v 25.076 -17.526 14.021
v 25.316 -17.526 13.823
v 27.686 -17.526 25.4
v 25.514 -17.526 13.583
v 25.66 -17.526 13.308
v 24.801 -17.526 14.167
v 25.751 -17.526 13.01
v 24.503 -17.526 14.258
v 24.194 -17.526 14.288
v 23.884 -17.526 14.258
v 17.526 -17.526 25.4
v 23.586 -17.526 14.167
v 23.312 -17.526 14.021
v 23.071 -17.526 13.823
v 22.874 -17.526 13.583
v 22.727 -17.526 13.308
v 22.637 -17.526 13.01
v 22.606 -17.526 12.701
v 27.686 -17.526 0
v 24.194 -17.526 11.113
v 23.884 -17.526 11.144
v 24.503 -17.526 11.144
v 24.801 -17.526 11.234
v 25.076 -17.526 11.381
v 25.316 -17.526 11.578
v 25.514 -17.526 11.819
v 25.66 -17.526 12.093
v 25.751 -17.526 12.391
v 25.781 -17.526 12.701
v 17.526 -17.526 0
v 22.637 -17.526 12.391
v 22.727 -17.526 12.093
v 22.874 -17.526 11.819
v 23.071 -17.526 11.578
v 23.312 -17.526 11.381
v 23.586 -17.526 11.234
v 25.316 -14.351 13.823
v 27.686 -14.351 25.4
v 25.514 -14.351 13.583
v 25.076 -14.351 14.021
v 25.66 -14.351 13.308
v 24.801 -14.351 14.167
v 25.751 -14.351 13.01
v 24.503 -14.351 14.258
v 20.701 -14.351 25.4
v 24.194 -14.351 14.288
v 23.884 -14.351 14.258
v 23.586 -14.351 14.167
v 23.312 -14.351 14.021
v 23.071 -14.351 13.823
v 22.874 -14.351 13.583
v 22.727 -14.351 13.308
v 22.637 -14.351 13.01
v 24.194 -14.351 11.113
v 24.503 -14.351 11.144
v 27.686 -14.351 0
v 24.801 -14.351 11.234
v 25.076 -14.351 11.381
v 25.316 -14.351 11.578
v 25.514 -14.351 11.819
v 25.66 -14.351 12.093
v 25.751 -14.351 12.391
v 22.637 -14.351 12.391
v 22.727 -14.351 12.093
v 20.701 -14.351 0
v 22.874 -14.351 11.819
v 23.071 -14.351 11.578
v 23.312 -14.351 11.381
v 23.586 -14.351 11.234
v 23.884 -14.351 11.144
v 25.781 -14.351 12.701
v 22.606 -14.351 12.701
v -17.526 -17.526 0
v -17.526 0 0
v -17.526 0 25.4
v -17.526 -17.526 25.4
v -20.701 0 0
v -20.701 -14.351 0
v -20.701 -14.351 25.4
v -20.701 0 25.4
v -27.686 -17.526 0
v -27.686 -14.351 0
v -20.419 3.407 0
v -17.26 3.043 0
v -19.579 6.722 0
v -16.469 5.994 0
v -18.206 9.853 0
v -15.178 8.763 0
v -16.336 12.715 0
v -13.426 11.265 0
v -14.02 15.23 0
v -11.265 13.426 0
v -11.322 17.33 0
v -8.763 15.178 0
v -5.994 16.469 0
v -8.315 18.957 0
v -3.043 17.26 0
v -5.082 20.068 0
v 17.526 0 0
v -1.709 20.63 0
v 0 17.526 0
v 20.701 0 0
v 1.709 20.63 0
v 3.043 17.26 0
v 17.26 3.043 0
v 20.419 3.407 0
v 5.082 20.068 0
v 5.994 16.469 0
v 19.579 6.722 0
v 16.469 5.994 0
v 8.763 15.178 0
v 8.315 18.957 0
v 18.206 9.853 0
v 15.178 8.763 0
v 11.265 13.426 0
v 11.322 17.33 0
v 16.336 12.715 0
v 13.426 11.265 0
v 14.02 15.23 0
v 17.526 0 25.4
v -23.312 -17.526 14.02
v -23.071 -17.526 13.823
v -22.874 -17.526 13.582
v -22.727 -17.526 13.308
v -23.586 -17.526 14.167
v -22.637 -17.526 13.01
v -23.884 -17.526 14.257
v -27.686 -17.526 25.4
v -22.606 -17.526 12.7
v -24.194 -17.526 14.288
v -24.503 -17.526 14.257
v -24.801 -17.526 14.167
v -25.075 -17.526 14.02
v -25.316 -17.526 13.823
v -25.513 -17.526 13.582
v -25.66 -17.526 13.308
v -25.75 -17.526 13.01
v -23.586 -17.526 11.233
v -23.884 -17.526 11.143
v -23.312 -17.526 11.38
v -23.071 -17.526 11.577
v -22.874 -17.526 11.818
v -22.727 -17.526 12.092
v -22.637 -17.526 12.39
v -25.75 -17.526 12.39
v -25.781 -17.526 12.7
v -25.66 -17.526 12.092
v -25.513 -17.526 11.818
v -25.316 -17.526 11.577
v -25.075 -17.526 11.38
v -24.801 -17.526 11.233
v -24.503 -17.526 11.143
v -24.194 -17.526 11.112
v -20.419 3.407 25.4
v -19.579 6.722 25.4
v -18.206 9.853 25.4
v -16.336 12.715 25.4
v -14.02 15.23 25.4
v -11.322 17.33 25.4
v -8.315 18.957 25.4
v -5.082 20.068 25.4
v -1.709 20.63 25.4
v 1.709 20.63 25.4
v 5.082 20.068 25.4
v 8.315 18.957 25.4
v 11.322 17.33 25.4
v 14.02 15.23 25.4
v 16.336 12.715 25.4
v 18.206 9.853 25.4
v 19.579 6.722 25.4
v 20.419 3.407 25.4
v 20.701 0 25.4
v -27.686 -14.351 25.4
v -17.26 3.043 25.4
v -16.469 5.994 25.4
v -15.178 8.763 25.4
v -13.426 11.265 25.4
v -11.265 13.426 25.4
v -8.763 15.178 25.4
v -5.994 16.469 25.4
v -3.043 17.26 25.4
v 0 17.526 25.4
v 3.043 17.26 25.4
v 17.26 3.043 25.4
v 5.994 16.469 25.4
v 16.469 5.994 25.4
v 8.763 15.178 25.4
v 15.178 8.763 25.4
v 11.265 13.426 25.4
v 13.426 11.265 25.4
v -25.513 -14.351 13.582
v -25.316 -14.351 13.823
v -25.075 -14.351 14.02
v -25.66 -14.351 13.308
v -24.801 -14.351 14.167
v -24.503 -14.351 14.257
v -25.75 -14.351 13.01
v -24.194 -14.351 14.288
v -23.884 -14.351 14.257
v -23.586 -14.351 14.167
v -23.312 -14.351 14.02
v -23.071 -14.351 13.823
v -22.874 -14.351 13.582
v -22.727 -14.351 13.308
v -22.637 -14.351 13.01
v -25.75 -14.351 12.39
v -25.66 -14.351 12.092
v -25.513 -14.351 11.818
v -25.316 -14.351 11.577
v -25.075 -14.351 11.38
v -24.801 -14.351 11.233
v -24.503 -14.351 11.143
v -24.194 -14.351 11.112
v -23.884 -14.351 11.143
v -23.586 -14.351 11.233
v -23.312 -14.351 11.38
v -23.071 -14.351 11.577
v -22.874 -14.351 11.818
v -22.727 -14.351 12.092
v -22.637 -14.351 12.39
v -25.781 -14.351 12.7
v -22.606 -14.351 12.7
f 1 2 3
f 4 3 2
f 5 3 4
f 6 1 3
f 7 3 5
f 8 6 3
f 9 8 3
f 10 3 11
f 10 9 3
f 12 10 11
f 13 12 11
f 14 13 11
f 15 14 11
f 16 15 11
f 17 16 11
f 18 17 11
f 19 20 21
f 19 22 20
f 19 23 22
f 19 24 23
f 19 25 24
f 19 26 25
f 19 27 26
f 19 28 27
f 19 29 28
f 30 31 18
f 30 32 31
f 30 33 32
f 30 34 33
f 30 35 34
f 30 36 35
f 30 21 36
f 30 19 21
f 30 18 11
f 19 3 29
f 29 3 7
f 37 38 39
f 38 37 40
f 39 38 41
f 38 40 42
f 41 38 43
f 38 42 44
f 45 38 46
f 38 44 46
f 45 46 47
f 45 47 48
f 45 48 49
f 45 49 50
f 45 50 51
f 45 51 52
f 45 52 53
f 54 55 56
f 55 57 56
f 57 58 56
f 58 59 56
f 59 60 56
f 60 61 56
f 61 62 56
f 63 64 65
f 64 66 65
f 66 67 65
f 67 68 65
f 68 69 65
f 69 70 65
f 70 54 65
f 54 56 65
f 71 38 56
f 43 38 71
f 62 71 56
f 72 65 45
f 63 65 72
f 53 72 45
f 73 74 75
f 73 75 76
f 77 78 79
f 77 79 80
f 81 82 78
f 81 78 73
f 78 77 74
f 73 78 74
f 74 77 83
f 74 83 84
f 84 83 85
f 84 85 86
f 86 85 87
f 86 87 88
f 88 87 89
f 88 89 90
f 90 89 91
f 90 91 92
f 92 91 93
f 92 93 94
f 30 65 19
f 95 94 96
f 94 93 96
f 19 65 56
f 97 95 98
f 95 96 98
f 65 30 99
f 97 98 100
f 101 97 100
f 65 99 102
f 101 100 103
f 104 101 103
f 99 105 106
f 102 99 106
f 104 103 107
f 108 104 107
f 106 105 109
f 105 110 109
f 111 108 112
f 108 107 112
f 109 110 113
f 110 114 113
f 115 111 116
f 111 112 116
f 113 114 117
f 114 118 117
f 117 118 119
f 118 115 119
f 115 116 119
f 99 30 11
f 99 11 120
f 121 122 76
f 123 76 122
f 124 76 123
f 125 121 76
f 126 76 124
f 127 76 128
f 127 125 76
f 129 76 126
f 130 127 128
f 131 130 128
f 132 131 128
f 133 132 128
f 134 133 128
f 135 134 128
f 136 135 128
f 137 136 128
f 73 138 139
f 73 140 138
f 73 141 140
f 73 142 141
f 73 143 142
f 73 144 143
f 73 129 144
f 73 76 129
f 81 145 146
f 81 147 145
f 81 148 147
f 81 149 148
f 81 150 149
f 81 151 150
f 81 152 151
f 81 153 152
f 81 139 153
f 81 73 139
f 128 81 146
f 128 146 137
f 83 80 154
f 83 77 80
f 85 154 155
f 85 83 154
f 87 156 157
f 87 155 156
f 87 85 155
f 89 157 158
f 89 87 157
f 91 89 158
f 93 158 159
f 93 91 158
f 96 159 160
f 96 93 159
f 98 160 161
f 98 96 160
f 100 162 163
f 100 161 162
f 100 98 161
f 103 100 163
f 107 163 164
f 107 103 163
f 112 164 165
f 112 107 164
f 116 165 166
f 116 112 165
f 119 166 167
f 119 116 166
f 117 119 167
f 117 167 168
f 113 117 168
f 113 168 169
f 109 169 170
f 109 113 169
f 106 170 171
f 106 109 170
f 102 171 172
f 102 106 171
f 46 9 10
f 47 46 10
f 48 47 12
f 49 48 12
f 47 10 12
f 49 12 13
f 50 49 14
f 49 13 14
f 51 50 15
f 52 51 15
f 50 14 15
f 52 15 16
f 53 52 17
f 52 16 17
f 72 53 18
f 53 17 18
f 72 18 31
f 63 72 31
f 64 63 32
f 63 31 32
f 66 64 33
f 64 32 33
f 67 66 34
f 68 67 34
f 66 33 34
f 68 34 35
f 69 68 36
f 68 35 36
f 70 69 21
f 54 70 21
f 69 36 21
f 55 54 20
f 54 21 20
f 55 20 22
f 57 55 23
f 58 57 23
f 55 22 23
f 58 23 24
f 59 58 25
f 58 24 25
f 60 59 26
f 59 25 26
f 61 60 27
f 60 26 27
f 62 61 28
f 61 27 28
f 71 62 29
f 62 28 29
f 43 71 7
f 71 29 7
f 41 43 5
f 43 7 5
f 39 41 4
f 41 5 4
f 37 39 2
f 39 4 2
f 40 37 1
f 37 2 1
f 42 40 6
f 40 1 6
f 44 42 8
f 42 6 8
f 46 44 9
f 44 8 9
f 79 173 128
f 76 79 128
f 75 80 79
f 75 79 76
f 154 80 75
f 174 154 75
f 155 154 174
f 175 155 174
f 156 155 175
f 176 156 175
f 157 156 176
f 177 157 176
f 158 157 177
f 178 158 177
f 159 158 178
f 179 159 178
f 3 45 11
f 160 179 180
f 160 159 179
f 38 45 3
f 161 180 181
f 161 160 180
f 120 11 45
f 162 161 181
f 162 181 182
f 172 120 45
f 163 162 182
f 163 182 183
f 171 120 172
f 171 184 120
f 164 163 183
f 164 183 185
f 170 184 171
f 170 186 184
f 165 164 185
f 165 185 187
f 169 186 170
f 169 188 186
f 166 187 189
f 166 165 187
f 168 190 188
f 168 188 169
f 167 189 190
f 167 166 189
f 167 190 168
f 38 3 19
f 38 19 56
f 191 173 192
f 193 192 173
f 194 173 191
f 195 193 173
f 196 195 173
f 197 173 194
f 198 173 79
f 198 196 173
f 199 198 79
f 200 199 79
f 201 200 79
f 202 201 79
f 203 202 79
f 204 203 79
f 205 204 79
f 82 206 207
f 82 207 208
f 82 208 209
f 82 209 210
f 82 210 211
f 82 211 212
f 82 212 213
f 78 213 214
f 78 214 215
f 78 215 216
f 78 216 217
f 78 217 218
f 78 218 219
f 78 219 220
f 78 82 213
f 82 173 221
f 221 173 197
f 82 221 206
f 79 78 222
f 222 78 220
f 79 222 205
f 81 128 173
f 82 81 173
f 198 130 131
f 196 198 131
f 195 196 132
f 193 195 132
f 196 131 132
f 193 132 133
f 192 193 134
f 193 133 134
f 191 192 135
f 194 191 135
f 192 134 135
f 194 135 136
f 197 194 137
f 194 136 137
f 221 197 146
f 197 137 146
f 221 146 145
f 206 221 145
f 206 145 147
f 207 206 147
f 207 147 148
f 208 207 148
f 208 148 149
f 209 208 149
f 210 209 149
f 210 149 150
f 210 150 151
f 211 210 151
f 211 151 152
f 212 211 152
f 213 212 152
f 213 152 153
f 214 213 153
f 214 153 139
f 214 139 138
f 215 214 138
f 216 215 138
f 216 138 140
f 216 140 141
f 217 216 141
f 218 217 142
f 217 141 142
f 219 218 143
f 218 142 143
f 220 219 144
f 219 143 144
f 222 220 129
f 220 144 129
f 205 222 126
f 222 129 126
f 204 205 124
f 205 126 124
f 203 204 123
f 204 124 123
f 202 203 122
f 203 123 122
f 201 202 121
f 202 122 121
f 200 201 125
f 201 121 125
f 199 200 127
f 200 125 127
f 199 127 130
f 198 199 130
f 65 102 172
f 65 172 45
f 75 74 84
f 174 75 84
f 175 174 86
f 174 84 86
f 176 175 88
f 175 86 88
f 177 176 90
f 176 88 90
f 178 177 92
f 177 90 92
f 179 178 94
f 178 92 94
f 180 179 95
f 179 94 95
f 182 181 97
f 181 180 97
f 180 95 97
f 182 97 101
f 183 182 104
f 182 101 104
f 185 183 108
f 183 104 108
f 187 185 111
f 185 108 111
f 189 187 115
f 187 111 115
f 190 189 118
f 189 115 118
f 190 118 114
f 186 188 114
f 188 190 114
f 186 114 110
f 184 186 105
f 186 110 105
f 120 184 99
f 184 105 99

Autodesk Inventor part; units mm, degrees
ref_plane "YZ Plane" through (0, 0, 0) normal (1, 0, 0) x (0, 1, 0)
ref_plane "XZ Plane" through (0, 0, 0) normal (0, 1, 0) x (-1, 0, 0)
ref_plane "XY Plane" through (0, 0, 0) normal (0, 0, 1) x (1, 0, 0)
sketch "Sketch1" plane through (0, 0, 0) normal (0, 0, 1) x (1, 0, 0)
  arc A0 (17.526, 0) -> (-17.526, 0) centre (0, 0) ccw
  arc A1 (20.701, 0) -> (-20.701, 0) centre (0, 0) ccw
  line L0 (17.526, 0) -> (20.701, 0)
  line L1 (20.701, 0) -> (20.701, -17.526)
  line L2 (20.701, -17.526) -> (17.526, -17.526)
  line L3 (17.526, -17.526) -> (17.526, 0)
  line L4 (-20.701, 0) -> (-17.526, 0)
  line L5 (-17.526, 0) -> (-17.526, -17.526)
  line L6 (-17.526, -17.526) -> (-20.701, -17.526)
  line L7 (-20.701, -17.526) -> (-20.701, 0)
  line L8 (-17.526, -17.526) -> (-27.686, -17.526)
  line L9 (-27.686, -17.526) -> (-27.686, -14.351)
  line L10 (-27.686, -14.351) -> (-17.526, -14.351)
  line L11 (-17.526, -14.351) -> (-17.526, -17.526)
  line L12 (17.526, -17.526) -> (27.686, -17.526)
  line L13 (27.686, -17.526) -> (27.686, -14.351)
  line L14 (27.686, -14.351) -> (17.526, -14.351)
  line L15 (17.526, -14.351) -> (17.526, -17.526)
  point P0 (-20.701, -14.351)
  point P1 (20.701, -14.351)
  dimension "d0" = 17.526
  dimension "d1" = 3.175
  dimension "d23" = 3.175
  dimension "d24" = 17.526
  dimension "d25" = 3.175
  dimension "d26" = 17.526
  dimension "d27" = 10.16
  dimension "d28" = 3.175
  dimension "d29" = 10.16
  dimension "d30" = 3.175
extrude "Extrusion1" add sketch "Sketch1" along normal blind 25.4
sketch "Sketch5" plane through (-27.686, -14.351, 0) normal (0, 1, 0) x (1, 0, 0)
  line L0 (6.985, 0) -> (0, 0) construction
  line L1 (6.985, -25.4) -> (0, -25.4) construction
  line L2 (0, 0) -> (6.985, -25.4) construction
  line L3 (0, 0) -> (0, -25.4) construction
  line L4 (6.985, 0) -> (0, -25.4) construction
  line L5 (45.212, -25.4) -> (55.372, -25.4) construction
  line L6 (48.387, 0) -> (55.372, -25.4) construction
  line L7 (45.212, 0) -> (55.372, 0) construction
  line L8 (55.372, 0) -> (48.387, -25.4) construction
  point P0 (27.686, 0)
  point P1 (3.4925, -12.7)
sketch "Sketch6" plane through (20.701, -14.351, 0) normal (0, 1, 0) x (1, 0, 0)
  point P0 (-20.701, 0)
  point P1 (3.4926, -12.7006)
hole "Hole3" at (24.1936, -14.351, 12.7006) direction (0, -1, 0) diameter 3.175 end through all
hole "Hole4" at (-24.1935, -14.351, 12.7) direction (0, -1, 0) diameter 3.175 end through all
properties part number "ShootingMech_MotorMount"
